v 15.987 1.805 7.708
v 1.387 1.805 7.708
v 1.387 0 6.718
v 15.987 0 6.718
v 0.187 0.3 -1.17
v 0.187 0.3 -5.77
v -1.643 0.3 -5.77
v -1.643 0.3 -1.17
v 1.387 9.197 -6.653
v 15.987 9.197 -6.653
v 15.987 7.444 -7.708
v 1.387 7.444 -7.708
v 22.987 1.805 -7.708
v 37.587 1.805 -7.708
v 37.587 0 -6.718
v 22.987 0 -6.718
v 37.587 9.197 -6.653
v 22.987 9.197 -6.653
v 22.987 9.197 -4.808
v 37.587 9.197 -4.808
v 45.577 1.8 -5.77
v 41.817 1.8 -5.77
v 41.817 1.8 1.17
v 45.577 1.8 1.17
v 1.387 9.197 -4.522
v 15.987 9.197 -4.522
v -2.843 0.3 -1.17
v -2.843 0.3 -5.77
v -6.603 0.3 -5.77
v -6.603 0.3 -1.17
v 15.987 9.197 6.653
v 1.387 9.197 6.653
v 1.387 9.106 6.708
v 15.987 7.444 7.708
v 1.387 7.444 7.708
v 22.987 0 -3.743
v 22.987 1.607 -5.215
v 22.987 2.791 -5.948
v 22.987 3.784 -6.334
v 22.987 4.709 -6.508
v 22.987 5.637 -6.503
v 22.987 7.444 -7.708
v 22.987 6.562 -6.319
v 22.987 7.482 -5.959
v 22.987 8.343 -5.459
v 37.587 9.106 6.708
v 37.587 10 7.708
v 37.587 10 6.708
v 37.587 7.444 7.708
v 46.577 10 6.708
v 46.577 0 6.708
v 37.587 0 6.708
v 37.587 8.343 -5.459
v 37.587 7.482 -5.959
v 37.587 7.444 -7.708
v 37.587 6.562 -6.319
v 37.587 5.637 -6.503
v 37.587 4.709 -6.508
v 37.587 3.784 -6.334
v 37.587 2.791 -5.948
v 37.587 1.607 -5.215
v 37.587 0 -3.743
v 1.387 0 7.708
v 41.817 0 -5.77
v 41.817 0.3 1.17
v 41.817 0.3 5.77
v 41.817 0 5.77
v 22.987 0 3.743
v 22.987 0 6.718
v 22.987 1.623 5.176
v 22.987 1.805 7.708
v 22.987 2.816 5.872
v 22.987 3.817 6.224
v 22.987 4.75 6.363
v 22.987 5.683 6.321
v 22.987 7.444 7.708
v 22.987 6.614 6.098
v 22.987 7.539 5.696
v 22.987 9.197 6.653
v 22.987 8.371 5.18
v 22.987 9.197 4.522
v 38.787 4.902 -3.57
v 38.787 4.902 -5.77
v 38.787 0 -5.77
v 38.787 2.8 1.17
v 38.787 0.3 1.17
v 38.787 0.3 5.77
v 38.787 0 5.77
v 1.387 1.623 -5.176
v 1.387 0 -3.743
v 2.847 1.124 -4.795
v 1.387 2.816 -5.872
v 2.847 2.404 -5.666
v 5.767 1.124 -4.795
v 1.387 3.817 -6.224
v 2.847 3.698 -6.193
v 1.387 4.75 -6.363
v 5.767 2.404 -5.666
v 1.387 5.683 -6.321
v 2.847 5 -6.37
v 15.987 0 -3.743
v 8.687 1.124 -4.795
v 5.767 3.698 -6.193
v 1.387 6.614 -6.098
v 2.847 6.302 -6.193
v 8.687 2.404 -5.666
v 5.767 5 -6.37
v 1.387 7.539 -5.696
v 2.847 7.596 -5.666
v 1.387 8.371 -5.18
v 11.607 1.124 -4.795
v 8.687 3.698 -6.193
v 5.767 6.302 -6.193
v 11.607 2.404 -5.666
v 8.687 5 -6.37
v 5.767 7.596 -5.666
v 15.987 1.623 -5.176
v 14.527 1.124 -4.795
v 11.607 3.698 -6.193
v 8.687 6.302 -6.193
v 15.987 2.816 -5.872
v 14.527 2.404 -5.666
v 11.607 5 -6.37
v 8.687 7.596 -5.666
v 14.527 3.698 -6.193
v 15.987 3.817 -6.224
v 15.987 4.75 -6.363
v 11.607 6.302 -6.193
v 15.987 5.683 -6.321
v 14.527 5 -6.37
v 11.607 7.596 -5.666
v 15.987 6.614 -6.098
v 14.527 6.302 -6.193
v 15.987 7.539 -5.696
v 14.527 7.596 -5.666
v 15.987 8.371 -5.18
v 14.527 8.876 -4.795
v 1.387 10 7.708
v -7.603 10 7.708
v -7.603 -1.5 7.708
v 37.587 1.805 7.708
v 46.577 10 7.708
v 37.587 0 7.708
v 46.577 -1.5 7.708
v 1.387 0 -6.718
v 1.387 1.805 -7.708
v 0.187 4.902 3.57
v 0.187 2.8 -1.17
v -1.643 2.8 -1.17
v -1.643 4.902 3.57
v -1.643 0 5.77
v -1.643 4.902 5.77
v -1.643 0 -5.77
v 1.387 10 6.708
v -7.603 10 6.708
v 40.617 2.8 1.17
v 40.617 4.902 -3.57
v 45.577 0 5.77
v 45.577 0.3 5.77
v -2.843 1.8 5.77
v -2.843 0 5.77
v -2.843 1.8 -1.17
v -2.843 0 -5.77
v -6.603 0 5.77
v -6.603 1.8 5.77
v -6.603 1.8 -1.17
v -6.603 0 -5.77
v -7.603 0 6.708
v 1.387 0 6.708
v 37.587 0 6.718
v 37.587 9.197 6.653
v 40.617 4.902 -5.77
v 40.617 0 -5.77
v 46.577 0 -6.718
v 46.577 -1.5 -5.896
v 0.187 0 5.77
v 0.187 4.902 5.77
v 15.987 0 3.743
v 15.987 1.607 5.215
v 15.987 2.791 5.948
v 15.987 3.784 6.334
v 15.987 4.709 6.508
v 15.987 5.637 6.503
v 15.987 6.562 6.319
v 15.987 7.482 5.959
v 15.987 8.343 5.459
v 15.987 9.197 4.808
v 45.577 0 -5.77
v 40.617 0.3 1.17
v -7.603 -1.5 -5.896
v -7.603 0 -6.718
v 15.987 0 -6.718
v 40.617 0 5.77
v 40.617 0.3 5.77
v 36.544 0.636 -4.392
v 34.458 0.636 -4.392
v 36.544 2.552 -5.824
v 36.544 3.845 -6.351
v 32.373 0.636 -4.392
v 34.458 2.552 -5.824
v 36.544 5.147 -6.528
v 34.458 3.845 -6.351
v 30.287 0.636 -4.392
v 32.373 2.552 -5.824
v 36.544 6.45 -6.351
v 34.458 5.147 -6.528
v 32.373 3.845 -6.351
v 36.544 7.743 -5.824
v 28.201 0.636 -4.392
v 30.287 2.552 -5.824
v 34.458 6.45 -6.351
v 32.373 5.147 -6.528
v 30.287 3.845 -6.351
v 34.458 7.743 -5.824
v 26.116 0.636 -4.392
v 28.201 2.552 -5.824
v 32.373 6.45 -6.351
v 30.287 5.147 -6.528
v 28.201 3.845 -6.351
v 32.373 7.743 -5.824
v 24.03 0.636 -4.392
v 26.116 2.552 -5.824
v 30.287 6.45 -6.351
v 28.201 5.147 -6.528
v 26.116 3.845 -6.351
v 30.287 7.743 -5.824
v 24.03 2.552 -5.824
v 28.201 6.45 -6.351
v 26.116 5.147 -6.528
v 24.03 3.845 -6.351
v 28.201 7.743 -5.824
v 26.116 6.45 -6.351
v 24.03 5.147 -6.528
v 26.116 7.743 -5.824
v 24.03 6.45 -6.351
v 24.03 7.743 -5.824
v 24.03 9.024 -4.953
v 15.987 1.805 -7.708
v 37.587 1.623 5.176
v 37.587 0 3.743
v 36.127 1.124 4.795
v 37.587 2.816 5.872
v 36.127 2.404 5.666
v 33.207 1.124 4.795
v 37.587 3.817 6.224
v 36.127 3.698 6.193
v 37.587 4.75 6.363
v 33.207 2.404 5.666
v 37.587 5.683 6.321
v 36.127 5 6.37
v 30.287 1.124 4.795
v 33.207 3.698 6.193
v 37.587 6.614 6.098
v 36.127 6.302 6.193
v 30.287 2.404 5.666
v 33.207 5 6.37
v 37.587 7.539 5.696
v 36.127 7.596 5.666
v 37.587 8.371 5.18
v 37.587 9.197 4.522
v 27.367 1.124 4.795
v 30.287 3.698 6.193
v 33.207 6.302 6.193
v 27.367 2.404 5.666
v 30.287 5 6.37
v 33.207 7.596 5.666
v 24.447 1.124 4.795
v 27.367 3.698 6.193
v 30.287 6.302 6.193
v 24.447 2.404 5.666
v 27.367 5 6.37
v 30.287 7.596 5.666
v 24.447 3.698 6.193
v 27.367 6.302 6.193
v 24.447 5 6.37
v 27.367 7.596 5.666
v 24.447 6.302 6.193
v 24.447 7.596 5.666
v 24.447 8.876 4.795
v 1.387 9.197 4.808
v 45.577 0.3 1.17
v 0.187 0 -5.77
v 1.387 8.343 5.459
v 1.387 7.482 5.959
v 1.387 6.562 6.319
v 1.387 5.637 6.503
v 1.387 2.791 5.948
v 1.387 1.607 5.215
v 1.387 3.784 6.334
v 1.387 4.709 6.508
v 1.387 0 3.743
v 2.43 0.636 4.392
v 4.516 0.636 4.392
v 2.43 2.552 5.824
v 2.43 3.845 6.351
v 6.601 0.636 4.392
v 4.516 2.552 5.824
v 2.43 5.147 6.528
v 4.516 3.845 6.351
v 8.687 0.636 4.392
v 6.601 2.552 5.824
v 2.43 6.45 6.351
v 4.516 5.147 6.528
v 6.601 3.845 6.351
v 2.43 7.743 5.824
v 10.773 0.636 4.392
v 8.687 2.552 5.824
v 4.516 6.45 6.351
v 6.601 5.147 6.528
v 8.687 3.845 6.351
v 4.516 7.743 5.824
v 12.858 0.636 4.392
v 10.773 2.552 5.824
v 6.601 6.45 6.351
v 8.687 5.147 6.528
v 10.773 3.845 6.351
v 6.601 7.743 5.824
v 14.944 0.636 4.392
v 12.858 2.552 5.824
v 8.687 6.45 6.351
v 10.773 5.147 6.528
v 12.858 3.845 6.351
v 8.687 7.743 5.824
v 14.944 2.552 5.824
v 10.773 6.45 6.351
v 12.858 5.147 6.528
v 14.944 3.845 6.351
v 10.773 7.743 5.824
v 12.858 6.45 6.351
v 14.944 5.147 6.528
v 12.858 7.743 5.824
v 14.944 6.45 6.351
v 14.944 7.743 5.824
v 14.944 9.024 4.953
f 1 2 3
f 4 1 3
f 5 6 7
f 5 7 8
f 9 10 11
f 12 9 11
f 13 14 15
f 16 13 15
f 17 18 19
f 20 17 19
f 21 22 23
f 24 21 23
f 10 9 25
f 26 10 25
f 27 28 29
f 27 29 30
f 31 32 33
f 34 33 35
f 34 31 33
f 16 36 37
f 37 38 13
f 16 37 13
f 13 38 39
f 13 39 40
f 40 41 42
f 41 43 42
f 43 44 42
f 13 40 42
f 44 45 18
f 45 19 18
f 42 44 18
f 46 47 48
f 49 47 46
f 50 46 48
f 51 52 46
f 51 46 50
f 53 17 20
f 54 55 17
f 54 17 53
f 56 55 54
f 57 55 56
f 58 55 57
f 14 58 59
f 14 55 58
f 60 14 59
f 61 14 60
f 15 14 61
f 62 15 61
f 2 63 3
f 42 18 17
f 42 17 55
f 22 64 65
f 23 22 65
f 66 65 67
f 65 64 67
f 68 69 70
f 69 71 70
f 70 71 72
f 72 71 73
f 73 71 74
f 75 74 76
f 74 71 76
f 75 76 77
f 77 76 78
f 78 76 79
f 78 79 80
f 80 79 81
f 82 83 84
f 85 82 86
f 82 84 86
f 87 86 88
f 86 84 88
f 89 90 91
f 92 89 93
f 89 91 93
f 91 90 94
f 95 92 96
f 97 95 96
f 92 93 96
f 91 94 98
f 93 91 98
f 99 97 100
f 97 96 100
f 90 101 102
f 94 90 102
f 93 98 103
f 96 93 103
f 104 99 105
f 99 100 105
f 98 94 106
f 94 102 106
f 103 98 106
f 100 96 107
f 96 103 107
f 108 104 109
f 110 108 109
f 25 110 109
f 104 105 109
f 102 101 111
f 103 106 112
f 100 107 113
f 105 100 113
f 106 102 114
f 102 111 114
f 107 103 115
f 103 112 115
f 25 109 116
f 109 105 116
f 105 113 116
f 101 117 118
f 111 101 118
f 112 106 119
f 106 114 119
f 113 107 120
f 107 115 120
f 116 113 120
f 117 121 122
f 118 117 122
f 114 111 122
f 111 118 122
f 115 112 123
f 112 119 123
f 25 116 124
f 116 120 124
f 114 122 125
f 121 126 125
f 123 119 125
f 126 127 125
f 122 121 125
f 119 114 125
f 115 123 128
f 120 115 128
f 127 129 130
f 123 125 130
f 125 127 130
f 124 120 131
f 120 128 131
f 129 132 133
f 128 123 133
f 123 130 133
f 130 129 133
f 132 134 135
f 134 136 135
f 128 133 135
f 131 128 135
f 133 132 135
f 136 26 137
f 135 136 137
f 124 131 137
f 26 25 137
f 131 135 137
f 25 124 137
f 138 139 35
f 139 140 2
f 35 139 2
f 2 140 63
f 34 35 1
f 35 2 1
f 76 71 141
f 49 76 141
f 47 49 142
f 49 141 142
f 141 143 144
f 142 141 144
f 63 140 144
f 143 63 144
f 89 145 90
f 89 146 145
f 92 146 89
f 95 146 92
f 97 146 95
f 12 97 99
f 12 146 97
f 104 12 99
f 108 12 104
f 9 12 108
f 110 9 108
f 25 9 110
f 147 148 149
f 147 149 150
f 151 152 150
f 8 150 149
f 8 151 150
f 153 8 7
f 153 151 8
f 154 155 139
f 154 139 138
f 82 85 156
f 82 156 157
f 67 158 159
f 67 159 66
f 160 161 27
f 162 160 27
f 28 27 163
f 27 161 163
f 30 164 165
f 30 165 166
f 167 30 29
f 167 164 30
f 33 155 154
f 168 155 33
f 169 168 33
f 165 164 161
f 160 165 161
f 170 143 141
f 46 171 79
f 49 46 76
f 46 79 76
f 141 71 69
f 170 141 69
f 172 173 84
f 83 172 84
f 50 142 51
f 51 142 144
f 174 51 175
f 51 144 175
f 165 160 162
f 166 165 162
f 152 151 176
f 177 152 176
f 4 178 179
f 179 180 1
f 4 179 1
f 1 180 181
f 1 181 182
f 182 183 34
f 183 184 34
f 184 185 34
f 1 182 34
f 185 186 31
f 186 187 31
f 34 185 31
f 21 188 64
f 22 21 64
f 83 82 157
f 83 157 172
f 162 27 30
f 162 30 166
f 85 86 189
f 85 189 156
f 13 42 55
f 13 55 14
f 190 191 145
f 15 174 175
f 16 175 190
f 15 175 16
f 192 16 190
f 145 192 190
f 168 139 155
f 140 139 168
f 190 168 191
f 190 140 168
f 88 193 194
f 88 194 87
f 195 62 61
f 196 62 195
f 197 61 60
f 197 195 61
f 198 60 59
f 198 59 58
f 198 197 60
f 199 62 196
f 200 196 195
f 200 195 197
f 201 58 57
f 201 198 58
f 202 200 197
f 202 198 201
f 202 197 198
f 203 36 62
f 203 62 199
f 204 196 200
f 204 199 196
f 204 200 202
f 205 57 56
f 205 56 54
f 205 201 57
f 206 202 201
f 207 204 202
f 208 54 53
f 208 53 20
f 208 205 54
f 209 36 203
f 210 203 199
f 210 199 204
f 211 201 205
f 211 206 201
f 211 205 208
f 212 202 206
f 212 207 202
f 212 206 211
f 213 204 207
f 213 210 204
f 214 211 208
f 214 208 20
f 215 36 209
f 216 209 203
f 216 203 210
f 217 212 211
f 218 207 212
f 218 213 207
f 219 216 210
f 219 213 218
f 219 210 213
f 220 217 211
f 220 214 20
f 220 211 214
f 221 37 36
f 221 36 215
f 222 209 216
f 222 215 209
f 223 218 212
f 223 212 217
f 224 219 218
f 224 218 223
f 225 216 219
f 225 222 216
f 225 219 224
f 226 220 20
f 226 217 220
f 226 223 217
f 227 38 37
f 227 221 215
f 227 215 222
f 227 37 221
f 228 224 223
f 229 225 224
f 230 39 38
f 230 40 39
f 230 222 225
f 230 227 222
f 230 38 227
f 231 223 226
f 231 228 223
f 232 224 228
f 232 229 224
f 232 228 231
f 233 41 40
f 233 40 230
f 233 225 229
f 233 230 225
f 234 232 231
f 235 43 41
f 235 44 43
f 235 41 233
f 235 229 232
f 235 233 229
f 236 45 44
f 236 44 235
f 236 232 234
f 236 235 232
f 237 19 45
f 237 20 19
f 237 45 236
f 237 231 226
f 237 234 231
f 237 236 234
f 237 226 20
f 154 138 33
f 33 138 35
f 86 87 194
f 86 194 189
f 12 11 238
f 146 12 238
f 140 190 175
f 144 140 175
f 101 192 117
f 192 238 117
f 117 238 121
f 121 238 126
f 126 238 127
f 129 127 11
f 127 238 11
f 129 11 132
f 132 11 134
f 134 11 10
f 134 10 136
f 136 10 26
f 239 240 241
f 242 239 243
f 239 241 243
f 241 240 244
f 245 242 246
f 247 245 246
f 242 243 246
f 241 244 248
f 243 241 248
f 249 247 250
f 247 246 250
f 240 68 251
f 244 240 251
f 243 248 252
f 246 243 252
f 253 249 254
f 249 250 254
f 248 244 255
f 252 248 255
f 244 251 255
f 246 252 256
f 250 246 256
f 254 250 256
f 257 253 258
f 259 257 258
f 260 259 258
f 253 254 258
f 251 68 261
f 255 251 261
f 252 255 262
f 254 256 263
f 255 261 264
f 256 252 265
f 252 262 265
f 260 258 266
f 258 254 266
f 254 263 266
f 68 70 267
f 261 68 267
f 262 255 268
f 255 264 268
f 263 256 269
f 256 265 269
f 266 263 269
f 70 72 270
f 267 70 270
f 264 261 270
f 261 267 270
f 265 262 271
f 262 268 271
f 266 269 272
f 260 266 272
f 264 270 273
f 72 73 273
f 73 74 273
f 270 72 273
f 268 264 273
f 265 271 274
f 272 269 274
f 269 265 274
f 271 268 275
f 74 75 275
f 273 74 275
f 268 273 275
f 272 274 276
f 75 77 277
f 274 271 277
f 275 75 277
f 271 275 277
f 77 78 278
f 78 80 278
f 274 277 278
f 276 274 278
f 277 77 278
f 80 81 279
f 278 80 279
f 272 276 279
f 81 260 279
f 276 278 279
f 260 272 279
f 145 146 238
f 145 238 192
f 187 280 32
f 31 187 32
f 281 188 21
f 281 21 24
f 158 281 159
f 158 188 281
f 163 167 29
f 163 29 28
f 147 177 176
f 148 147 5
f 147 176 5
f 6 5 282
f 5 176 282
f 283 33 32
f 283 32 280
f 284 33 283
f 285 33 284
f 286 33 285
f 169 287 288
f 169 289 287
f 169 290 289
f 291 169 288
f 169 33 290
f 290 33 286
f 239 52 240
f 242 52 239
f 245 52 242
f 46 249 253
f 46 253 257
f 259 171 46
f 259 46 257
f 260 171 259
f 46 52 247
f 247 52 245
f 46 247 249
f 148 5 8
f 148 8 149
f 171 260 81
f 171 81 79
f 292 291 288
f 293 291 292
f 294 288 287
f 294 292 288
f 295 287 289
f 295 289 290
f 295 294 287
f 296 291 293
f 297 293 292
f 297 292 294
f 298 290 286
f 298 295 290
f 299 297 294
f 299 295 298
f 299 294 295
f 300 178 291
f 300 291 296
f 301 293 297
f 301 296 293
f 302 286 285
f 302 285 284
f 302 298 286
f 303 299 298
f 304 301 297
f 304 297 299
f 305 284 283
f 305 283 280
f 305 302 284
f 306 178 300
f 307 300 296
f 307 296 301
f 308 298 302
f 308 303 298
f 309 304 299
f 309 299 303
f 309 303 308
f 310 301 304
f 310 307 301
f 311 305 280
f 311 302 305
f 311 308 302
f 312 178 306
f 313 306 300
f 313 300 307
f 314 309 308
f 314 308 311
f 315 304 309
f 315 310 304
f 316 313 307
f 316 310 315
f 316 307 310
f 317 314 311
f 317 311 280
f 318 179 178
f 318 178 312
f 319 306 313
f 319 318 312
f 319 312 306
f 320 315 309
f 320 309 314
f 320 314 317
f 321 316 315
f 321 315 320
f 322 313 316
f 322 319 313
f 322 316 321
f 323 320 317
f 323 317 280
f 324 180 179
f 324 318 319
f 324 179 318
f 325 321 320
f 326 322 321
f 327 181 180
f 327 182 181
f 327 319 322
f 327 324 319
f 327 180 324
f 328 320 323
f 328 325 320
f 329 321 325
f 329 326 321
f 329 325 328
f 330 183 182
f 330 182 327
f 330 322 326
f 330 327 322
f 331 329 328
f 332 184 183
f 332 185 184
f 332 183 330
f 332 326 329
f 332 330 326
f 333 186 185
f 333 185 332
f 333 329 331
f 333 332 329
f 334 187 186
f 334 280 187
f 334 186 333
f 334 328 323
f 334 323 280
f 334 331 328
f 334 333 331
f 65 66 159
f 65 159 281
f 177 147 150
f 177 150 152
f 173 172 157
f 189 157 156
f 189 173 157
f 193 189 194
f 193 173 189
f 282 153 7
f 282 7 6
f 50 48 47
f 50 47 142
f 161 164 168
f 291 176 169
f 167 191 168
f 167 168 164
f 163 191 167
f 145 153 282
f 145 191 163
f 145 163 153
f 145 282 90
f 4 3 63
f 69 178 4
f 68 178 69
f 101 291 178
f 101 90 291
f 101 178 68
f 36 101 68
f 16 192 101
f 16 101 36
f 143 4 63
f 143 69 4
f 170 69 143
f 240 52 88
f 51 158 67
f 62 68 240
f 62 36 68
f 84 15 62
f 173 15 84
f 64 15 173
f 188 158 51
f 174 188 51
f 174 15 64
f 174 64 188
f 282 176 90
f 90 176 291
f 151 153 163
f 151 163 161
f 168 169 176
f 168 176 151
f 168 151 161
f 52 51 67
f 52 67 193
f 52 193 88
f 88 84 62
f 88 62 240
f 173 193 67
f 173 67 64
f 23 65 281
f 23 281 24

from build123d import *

# Parameters (mm, degrees)
SKETCH_1_W               = 3.76
SKETCH_1_H               = 11.54
SKETCH_1_W_2             = 1.83
SKETCH_1_W_3             = 14.6
SKETCH_1_H_2             = 2.72
SKETCH_1_H_3             = 6.9
EXTRUDE_1_DEPTH          = 1
SKETCH_1_3_W             = 3.76
SKETCH_1_3_H             = 11.54
SKETCH_1_3_W_2           = 1.83
SKETCH_1_3_W_3           = 14.6
SKETCH_1_3_H_2           = 2.72
EXTRUDE_2_DEPTH          = 10
EXTRUDE_3_DEPTH          = 14.6
CUT_EXTRUDE_1_DEPTH      = 14.6
CUT_EXTRUDE_2_DEPTH      = 14.6
CUT_EXTRUDE_3_DEPTH      = 14.6
PATTERN_CIRCULAR_1_COUNT = 2
SKETCH_7_W               = 20.64829466
SKETCH_7_H               = 2.860597992
CUT_EXTRUDE_4_DEPTH      = 38.6
SKETCH_8_W               = 54.18
SKETCH_8_H               = 19.048575036
SKETCH_8_W_2             = 7
SKETCH_8_H_2             = 4.5
SKETCH_8_R               = 1.6
EXTRUDE_4_DEPTH          = 1.5
SKETCH_9_W               = 54.18
SKETCH_9_H               = 1.8
EXTRUDE_5_DEPTH          = 7
SKETCH_10_R              = 1.65
CUT_EXTRUDE_5_DEPTH      = 5
EXTRUDE_START            = 2
SKETCH_8_3_W             = 7
SKETCH_8_3_H             = 4.5
SKETCH_8_3_R             = 1.6
EXTRUDE_6_DEPTH          = 2
SKETCH_11_W              = 54.18
SKETCH_11_H              = 6.653379434
CUT_EXTRUDE_6_DEPTH      = 5
CUT_EXTRUDE_7_DEPTH      = 54.18
SKETCH_13_W              = 8.99
SKETCH_13_H              = 1
EXTRUDE_7_DEPTH          = 10


with BuildPart() as part:
    # 草图1 → 凸台-拉伸1 (new body)
    # profile 1 of 6: a face of its own
    with BuildSketch(Plane(origin=(0, 0, 0), x_dir=(1, 0, 0), z_dir=(0, 1, 0))):
        Polygon((-7.603, 6.17), (-7.603, -6.17), (1.387, -6.17), (1.387, -3.45), (1.387, 3.45), (1.387, 6.17), align=None)
        with Locations((-4.723, 0)):
            Rectangle(SKETCH_1_W, SKETCH_1_H, mode=Mode.SUBTRACT)
        with Locations((-0.728, 0)):
            Rectangle(SKETCH_1_W_2, SKETCH_1_H, mode=Mode.SUBTRACT)
    # profile 2 of 6: a face of its own
    with BuildSketch(Plane(origin=(0, 0, 0), x_dir=(1, 0, 0), z_dir=(0, 1, 0))):
        with Locations((8.687, -4.81)):
            Rectangle(SKETCH_1_W_3, SKETCH_1_H_2)
    # profile 3 of 6: a face of its own
    with BuildSketch(Plane(origin=(0, 0, 0), x_dir=(1, 0, 0), z_dir=(0, 1, 0))):
        with Locations((8.687, 0)):
            Rectangle(SKETCH_1_W_3, SKETCH_1_H_3)
    # profile 4 of 6: a face of its own
    with BuildSketch(Plane(origin=(0, 0, 0), x_dir=(1, 0, 0), z_dir=(0, 1, 0))):
        with Locations((8.687, 4.81)):
            Rectangle(SKETCH_1_W_3, SKETCH_1_H_2)
    # profile 5 of 6: a face of its own
    with BuildSketch(Plane(origin=(0, 0, 0), x_dir=(1, 0, 0), z_dir=(0, 1, 0))):
        with Locations((-4.723, 0)):
            Rectangle(SKETCH_1_W, SKETCH_1_H)
    # profile 6 of 6: a face of its own
    with BuildSketch(Plane(origin=(0, 0, 0), x_dir=(1, 0, 0), z_dir=(0, 1, 0))):
        with Locations((-0.728, 0)):
            Rectangle(SKETCH_1_W_2, SKETCH_1_H)
    extrude(amount=-EXTRUDE_1_DEPTH)

    # 草图1<3> → 凸台-拉伸2 (add)
    with BuildSketch(Plane(origin=(0, 0, 0), x_dir=(1, 0, 0), z_dir=(0, 1, 0))):
        with Locations((-4.723, 0)):
            Rectangle(SKETCH_1_3_W, SKETCH_1_3_H)
        with Locations((-0.728, 0)):
            Rectangle(SKETCH_1_3_W_2, SKETCH_1_3_H)
        with Locations((8.687, -4.81)):
            Rectangle(SKETCH_1_3_W_3, SKETCH_1_3_H_2)
        with Locations((8.687, 4.81)):
            Rectangle(SKETCH_1_3_W_3, SKETCH_1_3_H_2)
    extrude(amount=EXTRUDE_2_DEPTH)

    # 草图4 → 凸台-拉伸3 (add)
    with BuildSketch(Plane(origin=(15.987, 0, 0), x_dir=(0, 0, -1), z_dir=(1, 0, 0))):
        Polygon((6.17, 10), (7.707580576, 7.443577481), (7.707580576, 1.805314446), (6.17, -1), align=None)
        Polygon((-7.707580576, 1.805314446), (-6.17, -1), (-6.17, 10), (-7.707580576, 7.443577481), align=None)
    extrude(amount=-EXTRUDE_3_DEPTH)

    # 草图3 → 切除-拉伸1 (cut)
    with BuildSketch(Plane(origin=(15.987, 0, 0), x_dir=(0, 0, -1), z_dir=(1, 0, 0))):
        with BuildLine():
            Line((3.45, 0), (3.743222721, 0))
            add(Edge.make_bspline(
                [(3.743222721, 0), (3.911611309, 0.15963804), (4.29393083, 0.539845441), (4.994683036, 1.333496486), (5.723480991, 2.402845903), (6.251271172, 3.695549278), (6.429364414, 5), (6.251271172, 6.304450722), (5.723480991, 7.597154097), (4.994683036, 8.666503514), (4.253106755, 9.506390689), (3.815688064, 9.935054209), (3.597380816, 10.136172737)],
                knots=[0.014828564, 0.014828564, 0.014828564, 0.014828564, 0.0625, 0.125, 0.25, 0.375, 0.5, 0.625, 0.75, 0.875, 0.9375, 0.998871937, 0.998871937, 0.998871937, 0.998871937], degree=3))
            Line((3.597380816, 10.136172737), (3.45, 10))
            Line((3.45, 10), (3.45, 0))
        make_face()
        with BuildLine():
            Line((-3.45, 0), (-3.743222721, 0))
            add(Edge.make_bspline(
                [(-3.743222721, 0), (-3.781981306, 0.035623699), (-3.849464206, 0.098316559), (-4.072000203, 0.30899054), (-4.461726475, 0.698324492), (-5.152564834, 1.48074741), (-5.881362789, 2.550096827), (-6.40915297, 3.842800202), (-6.587246212, 5.147250924), (-6.40915297, 6.451701646), (-5.881362789, 7.744405021), (-5.152564834, 8.813754438), (-4.461708764, 9.596197415), (-4.071967827, 9.985543512), (-3.84942965, 10.196217487), (-3.781968617, 10.258889811), (-3.743222721, 10.294501848)],
                knots=[0, 0, 0, 0, 0.010893382, 0.018155637, 0.0625, 0.125, 0.25, 0.375, 0.5, 0.625, 0.75, 0.875, 0.9375, 0.981850307, 0.989110184, 1, 1, 1, 1], degree=3))
            Line((-3.743222721, 10.294501848), (-3.45, 10))
            Line((-3.45, 10), (-3.45, 0))
        make_face()
    extrude(amount=-CUT_EXTRUDE_1_DEPTH, mode=Mode.SUBTRACT)

    # 草图5 → 切除-拉伸2 (cut)
    with BuildSketch(Plane(origin=(0.187, 0, 0), x_dir=(0, 0, -1), z_dir=(1, 0, 0))):
        Polygon((1.17, 2.8), (-3.569711506, 4.901860767), (-5.77, 4.901860767), (-5.77, 10), (5.77, 10), (5.77, 0.3), (1.17, 0.3), align=None)
    extrude(amount=-CUT_EXTRUDE_2_DEPTH, mode=Mode.SUBTRACT)

    # 草图6 → 切除-拉伸3 (cut)
    with BuildSketch(Plane(origin=(-2.843, 0, 0), x_dir=(0, 0, -1), z_dir=(1, 0, 0))):
        Polygon((1.17, 5.538552109), (1.17, 1.8), (-3.795527251, 1.8), (-5.77, 1.8), (-5.77, 5.538552109), align=None)
    extrude(amount=-CUT_EXTRUDE_3_DEPTH, mode=Mode.SUBTRACT)


with BuildPart() as pattern_circular_1_1:
    # 阵列(圆周)1: pattern copy
    add(part.part.rotate(Axis((19.487, -1.5500525, 0), (0, 1, 0)), 1 * 360 / PATTERN_CIRCULAR_1_COUNT))


with BuildPart() as cut_extrude_4_tool:
    # 草图7 → 切除-拉伸4 (new body)
    with BuildSketch(Plane.ZY.offset(-1.387)):
        with Locations((-0.112362095, 10.62761907)):
            Rectangle(SKETCH_7_W, SKETCH_7_H)
    extrude(amount=-CUT_EXTRUDE_4_DEPTH)


with BuildPart() as part_1:
    add(part.part)

    # 切除-拉伸4: cut by cut_extrude_4_tool
    add(cut_extrude_4_tool.part, mode=Mode.SUBTRACT)



with BuildPart() as pattern_circular_1_1_1:
    add(pattern_circular_1_1.part)

    # 切除-拉伸4: cut by cut_extrude_4_tool
    add(cut_extrude_4_tool.part, mode=Mode.SUBTRACT)


with BuildPart() as part_2:
    add(part_1.part)

    add(pattern_circular_1_1_1.part)  # 凸台-拉伸4 merges 阵列(圆周)1_1
    # 草图8 → 凸台-拉伸4 (add)
    # profile 1 of 2: a face of its own
    with BuildSketch(Plane(origin=(0, 0, 0), x_dir=(1, 0, 0), z_dir=(0, 1, 0))):
        with Locations((19.487, 0)):
            Rectangle(SKETCH_8_W, SKETCH_8_H)
    # profile 2 of 2: a face of its own
    with BuildSketch(Plane(origin=(0, 0, 0), x_dir=(1, 0, 0), z_dir=(0, 1, 0))):
        with Locations((19.487, -11.774287518)):
            Rectangle(SKETCH_8_W_2, SKETCH_8_H_2)
        with Locations(Location((19.487, -11.774287518, 0), (0, 0, 270))):
            Circle(SKETCH_8_R, mode=Mode.SUBTRACT)
    extrude(amount=-EXTRUDE_4_DEPTH)

    # 草图9 → 凸台-拉伸5 (add)
    with BuildSketch(Plane(origin=(0, 0, 0), x_dir=(1, 0, 0), z_dir=(0, 1, 0))):
        with Locations((19.487, 8.624287518)):
            Rectangle(SKETCH_9_W, SKETCH_9_H)
    extrude(amount=EXTRUDE_5_DEPTH)

    # 草图10 → 切除-拉伸5 (cut)
    with BuildSketch(Plane.XY.offset(-7.724287518)):
        with Locations((-4.603, 2.5)):
            Circle(SKETCH_10_R)
        with Locations((43.577, 2.5)):
            Circle(SKETCH_10_R)
    extrude(amount=-CUT_EXTRUDE_5_DEPTH, mode=Mode.SUBTRACT)

    # 草图8<3> → 凸台-拉伸6 (add)
    with BuildSketch(Plane(origin=(0, 0, 0), x_dir=(1, 0, 0), z_dir=(0, 1, 0)).offset(EXTRUDE_START)):
        with Locations((19.487, -11.774287518)):
            Rectangle(SKETCH_8_3_W, SKETCH_8_3_H)
        with Locations(Location((19.487, -11.774287518, 0), (0, 0, 270))):
            Circle(SKETCH_8_3_R, mode=Mode.SUBTRACT)
    extrude(amount=-EXTRUDE_6_DEPTH)

    # 草图11 → 切除-拉伸6 (cut, symmetric)
    with BuildSketch(Plane(origin=(0, 0, 0), x_dir=(1, 0, 0), z_dir=(0, 1, 0))):
        with Locations((19.487, -11.034270293)):
            Rectangle(SKETCH_11_W, SKETCH_11_H)
    extrude(amount=CUT_EXTRUDE_6_DEPTH, both=True, mode=Mode.SUBTRACT)

    # 草图12 → 切除-拉伸7 (cut)
    with BuildSketch(Plane(origin=(46.577, 0, 0), x_dir=(0, 0, -1), z_dir=(1, 0, 0))):
        Polygon((7.707580576, 1.805314446), (5.895952187, -1.5), (9.524287518, -1.5), (9.524287518, 7.146168792), (7.724287518, 7), align=None)
    extrude(amount=-CUT_EXTRUDE_7_DEPTH, mode=Mode.SUBTRACT)

    # 草图13 → 凸台-拉伸7 (add)
    with BuildSketch(Plane(origin=(0, 0, 0), x_dir=(1, 0, 0), z_dir=(0, 1, 0))):
        with Locations((42.082, -7.207580576)):
            Rectangle(SKETCH_13_W, SKETCH_13_H)
        with Locations((-3.108, -7.207580576)):
            Rectangle(SKETCH_13_W, SKETCH_13_H)
    extrude(amount=EXTRUDE_7_DEPTH)


solid = part_2.part
